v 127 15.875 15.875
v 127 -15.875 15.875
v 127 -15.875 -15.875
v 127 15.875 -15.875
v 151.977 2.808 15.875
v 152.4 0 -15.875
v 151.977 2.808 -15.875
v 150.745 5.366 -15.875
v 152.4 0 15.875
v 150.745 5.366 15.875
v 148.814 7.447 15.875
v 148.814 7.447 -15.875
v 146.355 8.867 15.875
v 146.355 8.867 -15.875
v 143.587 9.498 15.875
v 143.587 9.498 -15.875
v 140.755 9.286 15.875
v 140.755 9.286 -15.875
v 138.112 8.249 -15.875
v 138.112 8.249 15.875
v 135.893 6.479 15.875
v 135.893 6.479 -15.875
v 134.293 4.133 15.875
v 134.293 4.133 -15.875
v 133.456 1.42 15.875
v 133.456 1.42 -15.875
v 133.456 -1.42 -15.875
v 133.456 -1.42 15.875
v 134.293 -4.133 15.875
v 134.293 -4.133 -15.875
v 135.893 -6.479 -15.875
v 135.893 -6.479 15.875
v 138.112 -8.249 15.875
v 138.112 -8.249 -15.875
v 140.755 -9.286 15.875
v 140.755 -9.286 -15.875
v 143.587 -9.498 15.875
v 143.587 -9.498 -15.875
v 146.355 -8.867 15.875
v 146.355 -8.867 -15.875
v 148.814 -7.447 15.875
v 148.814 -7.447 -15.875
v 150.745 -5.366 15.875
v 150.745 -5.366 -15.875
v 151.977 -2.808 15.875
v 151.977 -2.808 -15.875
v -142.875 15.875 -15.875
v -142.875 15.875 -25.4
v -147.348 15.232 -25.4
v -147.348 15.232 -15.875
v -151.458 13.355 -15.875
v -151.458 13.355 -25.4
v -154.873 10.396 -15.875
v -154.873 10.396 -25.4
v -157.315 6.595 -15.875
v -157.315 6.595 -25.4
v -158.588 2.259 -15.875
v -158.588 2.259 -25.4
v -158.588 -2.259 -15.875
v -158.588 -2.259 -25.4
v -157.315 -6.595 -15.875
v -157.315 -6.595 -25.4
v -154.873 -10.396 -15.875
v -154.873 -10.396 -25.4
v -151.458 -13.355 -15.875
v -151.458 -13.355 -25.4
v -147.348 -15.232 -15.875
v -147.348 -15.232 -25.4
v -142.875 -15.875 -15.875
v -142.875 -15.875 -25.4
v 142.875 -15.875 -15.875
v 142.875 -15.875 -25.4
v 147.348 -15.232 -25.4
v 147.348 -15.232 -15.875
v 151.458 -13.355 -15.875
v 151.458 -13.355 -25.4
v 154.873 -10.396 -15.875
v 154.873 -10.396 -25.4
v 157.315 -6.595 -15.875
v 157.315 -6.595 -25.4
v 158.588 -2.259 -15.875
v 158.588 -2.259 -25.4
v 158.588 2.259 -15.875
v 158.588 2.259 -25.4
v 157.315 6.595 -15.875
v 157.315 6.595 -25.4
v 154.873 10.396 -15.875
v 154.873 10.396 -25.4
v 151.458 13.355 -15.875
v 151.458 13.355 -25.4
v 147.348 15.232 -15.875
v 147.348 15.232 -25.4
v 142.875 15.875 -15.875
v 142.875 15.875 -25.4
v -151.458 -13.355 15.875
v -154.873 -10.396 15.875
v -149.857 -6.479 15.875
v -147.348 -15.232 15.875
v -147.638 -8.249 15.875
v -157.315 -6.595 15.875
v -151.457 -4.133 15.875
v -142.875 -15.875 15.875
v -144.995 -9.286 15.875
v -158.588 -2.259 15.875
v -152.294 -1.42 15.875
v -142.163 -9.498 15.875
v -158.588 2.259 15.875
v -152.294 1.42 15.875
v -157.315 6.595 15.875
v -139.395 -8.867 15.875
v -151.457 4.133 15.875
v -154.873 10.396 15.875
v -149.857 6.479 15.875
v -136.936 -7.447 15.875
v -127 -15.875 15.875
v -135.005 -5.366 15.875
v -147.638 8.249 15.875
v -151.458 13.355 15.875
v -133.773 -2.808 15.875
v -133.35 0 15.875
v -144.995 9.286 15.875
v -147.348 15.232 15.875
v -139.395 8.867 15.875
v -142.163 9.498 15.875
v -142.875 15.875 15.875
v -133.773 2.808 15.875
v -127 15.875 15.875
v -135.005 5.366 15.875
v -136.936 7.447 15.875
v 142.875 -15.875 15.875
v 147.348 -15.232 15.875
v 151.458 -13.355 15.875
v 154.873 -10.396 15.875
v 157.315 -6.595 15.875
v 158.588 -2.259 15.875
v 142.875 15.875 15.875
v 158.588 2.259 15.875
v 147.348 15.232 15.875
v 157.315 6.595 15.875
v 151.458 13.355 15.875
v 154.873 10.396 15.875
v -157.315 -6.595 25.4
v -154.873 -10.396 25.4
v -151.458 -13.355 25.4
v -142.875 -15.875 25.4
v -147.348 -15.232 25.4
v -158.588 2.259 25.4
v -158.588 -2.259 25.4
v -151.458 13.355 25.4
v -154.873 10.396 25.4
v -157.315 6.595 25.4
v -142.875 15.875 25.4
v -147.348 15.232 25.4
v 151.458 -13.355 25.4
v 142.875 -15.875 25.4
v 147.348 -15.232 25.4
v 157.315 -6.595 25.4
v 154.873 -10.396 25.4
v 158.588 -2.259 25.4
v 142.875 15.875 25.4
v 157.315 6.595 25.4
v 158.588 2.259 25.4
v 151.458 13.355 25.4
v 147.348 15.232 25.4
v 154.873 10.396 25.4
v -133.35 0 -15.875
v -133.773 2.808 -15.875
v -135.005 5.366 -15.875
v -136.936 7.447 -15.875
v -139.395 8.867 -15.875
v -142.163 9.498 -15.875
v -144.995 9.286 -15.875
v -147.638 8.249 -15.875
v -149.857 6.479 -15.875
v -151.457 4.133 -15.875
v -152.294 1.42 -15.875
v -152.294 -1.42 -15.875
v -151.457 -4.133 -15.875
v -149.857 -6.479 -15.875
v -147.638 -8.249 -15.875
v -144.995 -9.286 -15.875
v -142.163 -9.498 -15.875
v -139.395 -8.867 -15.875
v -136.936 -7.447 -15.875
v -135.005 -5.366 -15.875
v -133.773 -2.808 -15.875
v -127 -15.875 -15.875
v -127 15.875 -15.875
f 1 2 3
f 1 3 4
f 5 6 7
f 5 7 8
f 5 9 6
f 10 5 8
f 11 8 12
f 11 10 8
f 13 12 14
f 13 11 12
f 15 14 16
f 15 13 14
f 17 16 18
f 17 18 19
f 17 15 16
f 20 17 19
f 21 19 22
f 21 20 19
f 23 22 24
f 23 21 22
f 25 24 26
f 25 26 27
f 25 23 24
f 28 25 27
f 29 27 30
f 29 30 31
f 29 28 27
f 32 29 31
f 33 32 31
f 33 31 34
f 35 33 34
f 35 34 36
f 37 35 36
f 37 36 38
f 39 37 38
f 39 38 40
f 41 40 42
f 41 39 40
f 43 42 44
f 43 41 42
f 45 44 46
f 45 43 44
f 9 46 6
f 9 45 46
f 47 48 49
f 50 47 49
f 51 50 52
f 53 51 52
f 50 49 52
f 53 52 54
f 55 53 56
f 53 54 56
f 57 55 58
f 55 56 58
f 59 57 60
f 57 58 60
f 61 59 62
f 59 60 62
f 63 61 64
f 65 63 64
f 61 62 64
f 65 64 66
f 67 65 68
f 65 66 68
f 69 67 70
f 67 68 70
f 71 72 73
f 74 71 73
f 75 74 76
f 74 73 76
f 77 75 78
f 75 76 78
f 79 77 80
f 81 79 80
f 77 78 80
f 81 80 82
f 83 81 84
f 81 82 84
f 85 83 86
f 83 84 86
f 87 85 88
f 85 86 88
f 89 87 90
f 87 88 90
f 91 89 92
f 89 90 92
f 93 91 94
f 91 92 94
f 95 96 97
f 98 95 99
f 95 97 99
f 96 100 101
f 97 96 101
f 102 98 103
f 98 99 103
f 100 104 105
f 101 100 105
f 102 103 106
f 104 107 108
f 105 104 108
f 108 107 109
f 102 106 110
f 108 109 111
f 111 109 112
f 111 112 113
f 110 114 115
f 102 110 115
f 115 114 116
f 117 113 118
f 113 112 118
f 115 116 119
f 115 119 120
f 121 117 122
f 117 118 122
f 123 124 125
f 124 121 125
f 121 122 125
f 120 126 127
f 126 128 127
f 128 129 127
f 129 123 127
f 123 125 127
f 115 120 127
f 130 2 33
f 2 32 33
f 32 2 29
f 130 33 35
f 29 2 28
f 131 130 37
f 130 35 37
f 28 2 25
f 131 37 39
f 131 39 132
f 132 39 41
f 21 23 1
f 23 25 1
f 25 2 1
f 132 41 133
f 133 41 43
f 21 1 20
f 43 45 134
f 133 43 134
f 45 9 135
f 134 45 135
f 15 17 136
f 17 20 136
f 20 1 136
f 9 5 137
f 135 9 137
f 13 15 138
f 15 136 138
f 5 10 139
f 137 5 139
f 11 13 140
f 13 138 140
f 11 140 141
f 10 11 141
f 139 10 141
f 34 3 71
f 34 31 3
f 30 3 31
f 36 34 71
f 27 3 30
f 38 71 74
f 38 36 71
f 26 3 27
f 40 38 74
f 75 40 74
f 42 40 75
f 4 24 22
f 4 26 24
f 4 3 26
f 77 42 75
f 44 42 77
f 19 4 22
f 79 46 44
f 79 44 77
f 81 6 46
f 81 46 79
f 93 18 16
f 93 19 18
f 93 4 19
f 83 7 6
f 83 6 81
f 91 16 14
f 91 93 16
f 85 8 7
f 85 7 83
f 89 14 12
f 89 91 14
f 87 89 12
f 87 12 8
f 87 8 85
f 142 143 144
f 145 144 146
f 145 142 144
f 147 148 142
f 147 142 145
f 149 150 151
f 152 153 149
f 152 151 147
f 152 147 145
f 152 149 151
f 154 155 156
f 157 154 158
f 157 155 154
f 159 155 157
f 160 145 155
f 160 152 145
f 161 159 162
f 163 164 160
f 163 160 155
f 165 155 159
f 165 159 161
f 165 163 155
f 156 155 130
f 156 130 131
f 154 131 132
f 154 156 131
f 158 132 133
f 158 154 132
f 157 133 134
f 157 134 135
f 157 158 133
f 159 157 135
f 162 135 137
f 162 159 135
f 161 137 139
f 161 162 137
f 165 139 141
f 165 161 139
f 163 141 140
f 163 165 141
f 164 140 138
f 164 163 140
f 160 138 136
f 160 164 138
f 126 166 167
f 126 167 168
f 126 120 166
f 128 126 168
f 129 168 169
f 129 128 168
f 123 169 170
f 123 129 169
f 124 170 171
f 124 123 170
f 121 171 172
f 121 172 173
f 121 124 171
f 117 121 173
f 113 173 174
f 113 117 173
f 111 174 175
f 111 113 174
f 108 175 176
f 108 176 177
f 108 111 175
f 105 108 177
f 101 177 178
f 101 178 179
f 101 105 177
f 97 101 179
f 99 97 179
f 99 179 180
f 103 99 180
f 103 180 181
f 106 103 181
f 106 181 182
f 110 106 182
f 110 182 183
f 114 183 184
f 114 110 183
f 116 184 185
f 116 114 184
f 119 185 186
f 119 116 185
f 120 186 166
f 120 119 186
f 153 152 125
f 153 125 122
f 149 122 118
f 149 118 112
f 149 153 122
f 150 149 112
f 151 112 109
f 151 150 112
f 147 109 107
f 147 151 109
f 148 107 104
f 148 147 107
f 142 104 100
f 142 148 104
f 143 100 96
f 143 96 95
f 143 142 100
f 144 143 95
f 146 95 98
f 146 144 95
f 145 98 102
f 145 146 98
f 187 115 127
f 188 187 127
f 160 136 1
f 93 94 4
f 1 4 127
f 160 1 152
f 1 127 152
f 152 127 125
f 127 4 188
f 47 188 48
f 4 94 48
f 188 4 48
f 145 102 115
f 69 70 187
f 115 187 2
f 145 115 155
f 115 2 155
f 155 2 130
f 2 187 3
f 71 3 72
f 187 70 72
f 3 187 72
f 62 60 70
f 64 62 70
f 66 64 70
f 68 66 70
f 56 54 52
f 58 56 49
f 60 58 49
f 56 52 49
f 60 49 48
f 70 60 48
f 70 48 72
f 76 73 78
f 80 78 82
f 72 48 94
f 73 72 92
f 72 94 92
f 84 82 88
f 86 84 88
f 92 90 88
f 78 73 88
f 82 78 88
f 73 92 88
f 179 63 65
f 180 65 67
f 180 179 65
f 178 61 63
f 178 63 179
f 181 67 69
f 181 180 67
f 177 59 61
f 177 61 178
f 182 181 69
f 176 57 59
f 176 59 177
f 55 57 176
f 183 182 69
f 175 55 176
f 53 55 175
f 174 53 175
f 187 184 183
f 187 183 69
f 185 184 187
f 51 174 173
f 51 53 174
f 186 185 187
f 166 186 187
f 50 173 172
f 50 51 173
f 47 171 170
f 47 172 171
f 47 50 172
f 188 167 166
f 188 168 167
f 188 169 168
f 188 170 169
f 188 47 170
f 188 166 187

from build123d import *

# Parameters (mm, degrees)
SKETCH1_W                  = 254
SKETCH1_H                  = 31.75
BOSS_EXTRUDE1_DEPTH        = 25.4
BOSS_EXTRUDE1_DEPTH_BACK   = 25.4
SKETCH1_R                  = 9.525
BOSS_EXTRUDE1_2_DEPTH      = 25.4
BOSS_EXTRUDE1_2_DEPTH_BACK = 25.4
BOSS_EXTRUDE1_3_DEPTH      = 25.4
BOSS_EXTRUDE1_3_DEPTH_BACK = 25.4
BOSS_EXTRUDE2_START        = 25.4
SKETCH1_4_R                = 15.875
SKETCH1_4_R_2              = 9.525
BOSS_EXTRUDE2_DEPTH        = 9.525
BOSS_EXTRUDE3_START        = -25.4
SKETCH1_5_R                = 15.875
SKETCH1_5_R_2              = 9.525
BOSS_EXTRUDE3_DEPTH        = 9.525


with BuildPart() as part:
    # Sketch1 → Boss-Extrude1 (new body, two sides)
    with BuildSketch(Plane.XY) as boss_extrude1_sk:
        Rectangle(SKETCH1_W, SKETCH1_H)
    extrude(amount=BOSS_EXTRUDE1_DEPTH)
    extrude(boss_extrude1_sk.sketch, amount=-BOSS_EXTRUDE1_DEPTH_BACK)



with BuildPart() as body_2:
    # Sketch1 → Boss-Extrude1 2 (new body, two sides)
    with BuildSketch(Plane.XY) as boss_extrude1_2_sk:
        with Locations((-142.875, 0)):
            Circle(SKETCH1_R)
    extrude(amount=BOSS_EXTRUDE1_2_DEPTH)
    extrude(boss_extrude1_2_sk.sketch, amount=-BOSS_EXTRUDE1_2_DEPTH_BACK)


with BuildPart() as body_3:
    # Sketch1 → Boss-Extrude1 3 (new body, two sides)
    with BuildSketch(Plane.XY) as boss_extrude1_3_sk:
        with Locations((142.875, 0)):
            Circle(SKETCH1_R)
    extrude(amount=BOSS_EXTRUDE1_3_DEPTH)
    extrude(boss_extrude1_3_sk.sketch, amount=-BOSS_EXTRUDE1_3_DEPTH_BACK)


with BuildPart() as part_1:
    add(part.part)

    add(body_2.part)  # Boss-Extrude2 merges body 2

    add(body_3.part)  # Boss-Extrude2 merges body 3
    # Sketch1<4> → Boss-Extrude2 (add)
    with BuildSketch(Plane.XY.offset(BOSS_EXTRUDE2_START)):
        with BuildLine():
            Line((-127, 15.875), (-142.875, 15.875))
            ThreePointArc((-142.875, 15.875), (-131.649679849, 11.225320151), (-127, 0))
            Line((-127, 0), (-127, 15.875))
        make_face()
        with Locations((-142.875, 0)):
            Circle(SKETCH1_4_R)
        with Locations((-142.875, 0)):
            Circle(SKETCH1_4_R_2, mode=Mode.SUBTRACT)
        with BuildLine():
            Line((-127, -15.875), (-127, 0))
            ThreePointArc((-127, 0), (-131.649679849, -11.225320151), (-142.875, -15.875))
            Line((-142.875, -15.875), (-127, -15.875))
        make_face()
        with BuildLine():
            Line((142.875, 15.875), (127, 15.875))
            Line((127, 15.875), (127, 3.4e-08))
            ThreePointArc((127, 3.4e-08), (131.649679861, 11.225320163), (142.875, 15.875))
        make_face()
        with Locations((142.875, 0)):
            Circle(SKETCH1_4_R)
        with Locations((142.875, 0)):
            Circle(SKETCH1_4_R_2, mode=Mode.SUBTRACT)
        with BuildLine():
            ThreePointArc((142.875, -15.875), (131.649679837, -11.225320139), (127, 3.4e-08))
            Line((127, 3.4e-08), (127, -15.875))
            Line((127, -15.875), (142.875, -15.875))
        make_face()
    extrude(amount=-BOSS_EXTRUDE2_DEPTH)

    # Sketch1<5> → Boss-Extrude3 (add)
    with BuildSketch(Plane.XY.offset(BOSS_EXTRUDE3_START)):
        with Locations((-142.875, 0)):
            Circle(SKETCH1_5_R)
        with Locations((-142.875, 0)):
            Circle(SKETCH1_5_R_2, mode=Mode.SUBTRACT)
        with BuildLine():
            Line((-127, 15.875), (-142.875, 15.875))
            ThreePointArc((-142.875, 15.875), (-131.649679849, 11.225320151), (-127, 0))
            Line((-127, 0), (-127, 15.875))
        make_face()
        with BuildLine():
            Line((-127, -15.875), (-127, 0))
            ThreePointArc((-127, 0), (-131.649679849, -11.225320151), (-142.875, -15.875))
            Line((-142.875, -15.875), (-127, -15.875))
        make_face()
        with BuildLine():
            Line((142.875, 15.875), (127, 15.875))
            Line((127, 15.875), (127, 3.4e-08))
            ThreePointArc((127, 3.4e-08), (131.649679861, 11.225320163), (142.875, 15.875))
        make_face()
        with Locations((142.875, 0)):
            Circle(SKETCH1_5_R)
        with Locations((142.875, 0)):
            Circle(SKETCH1_5_R_2, mode=Mode.SUBTRACT)
        with BuildLine():
            ThreePointArc((142.875, -15.875), (131.649679837, -11.225320139), (127, 3.4e-08))
            Line((127, 3.4e-08), (127, -15.875))
            Line((127, -15.875), (142.875, -15.875))
        make_face()
    extrude(amount=BOSS_EXTRUDE3_DEPTH)


solid = part_1.part
